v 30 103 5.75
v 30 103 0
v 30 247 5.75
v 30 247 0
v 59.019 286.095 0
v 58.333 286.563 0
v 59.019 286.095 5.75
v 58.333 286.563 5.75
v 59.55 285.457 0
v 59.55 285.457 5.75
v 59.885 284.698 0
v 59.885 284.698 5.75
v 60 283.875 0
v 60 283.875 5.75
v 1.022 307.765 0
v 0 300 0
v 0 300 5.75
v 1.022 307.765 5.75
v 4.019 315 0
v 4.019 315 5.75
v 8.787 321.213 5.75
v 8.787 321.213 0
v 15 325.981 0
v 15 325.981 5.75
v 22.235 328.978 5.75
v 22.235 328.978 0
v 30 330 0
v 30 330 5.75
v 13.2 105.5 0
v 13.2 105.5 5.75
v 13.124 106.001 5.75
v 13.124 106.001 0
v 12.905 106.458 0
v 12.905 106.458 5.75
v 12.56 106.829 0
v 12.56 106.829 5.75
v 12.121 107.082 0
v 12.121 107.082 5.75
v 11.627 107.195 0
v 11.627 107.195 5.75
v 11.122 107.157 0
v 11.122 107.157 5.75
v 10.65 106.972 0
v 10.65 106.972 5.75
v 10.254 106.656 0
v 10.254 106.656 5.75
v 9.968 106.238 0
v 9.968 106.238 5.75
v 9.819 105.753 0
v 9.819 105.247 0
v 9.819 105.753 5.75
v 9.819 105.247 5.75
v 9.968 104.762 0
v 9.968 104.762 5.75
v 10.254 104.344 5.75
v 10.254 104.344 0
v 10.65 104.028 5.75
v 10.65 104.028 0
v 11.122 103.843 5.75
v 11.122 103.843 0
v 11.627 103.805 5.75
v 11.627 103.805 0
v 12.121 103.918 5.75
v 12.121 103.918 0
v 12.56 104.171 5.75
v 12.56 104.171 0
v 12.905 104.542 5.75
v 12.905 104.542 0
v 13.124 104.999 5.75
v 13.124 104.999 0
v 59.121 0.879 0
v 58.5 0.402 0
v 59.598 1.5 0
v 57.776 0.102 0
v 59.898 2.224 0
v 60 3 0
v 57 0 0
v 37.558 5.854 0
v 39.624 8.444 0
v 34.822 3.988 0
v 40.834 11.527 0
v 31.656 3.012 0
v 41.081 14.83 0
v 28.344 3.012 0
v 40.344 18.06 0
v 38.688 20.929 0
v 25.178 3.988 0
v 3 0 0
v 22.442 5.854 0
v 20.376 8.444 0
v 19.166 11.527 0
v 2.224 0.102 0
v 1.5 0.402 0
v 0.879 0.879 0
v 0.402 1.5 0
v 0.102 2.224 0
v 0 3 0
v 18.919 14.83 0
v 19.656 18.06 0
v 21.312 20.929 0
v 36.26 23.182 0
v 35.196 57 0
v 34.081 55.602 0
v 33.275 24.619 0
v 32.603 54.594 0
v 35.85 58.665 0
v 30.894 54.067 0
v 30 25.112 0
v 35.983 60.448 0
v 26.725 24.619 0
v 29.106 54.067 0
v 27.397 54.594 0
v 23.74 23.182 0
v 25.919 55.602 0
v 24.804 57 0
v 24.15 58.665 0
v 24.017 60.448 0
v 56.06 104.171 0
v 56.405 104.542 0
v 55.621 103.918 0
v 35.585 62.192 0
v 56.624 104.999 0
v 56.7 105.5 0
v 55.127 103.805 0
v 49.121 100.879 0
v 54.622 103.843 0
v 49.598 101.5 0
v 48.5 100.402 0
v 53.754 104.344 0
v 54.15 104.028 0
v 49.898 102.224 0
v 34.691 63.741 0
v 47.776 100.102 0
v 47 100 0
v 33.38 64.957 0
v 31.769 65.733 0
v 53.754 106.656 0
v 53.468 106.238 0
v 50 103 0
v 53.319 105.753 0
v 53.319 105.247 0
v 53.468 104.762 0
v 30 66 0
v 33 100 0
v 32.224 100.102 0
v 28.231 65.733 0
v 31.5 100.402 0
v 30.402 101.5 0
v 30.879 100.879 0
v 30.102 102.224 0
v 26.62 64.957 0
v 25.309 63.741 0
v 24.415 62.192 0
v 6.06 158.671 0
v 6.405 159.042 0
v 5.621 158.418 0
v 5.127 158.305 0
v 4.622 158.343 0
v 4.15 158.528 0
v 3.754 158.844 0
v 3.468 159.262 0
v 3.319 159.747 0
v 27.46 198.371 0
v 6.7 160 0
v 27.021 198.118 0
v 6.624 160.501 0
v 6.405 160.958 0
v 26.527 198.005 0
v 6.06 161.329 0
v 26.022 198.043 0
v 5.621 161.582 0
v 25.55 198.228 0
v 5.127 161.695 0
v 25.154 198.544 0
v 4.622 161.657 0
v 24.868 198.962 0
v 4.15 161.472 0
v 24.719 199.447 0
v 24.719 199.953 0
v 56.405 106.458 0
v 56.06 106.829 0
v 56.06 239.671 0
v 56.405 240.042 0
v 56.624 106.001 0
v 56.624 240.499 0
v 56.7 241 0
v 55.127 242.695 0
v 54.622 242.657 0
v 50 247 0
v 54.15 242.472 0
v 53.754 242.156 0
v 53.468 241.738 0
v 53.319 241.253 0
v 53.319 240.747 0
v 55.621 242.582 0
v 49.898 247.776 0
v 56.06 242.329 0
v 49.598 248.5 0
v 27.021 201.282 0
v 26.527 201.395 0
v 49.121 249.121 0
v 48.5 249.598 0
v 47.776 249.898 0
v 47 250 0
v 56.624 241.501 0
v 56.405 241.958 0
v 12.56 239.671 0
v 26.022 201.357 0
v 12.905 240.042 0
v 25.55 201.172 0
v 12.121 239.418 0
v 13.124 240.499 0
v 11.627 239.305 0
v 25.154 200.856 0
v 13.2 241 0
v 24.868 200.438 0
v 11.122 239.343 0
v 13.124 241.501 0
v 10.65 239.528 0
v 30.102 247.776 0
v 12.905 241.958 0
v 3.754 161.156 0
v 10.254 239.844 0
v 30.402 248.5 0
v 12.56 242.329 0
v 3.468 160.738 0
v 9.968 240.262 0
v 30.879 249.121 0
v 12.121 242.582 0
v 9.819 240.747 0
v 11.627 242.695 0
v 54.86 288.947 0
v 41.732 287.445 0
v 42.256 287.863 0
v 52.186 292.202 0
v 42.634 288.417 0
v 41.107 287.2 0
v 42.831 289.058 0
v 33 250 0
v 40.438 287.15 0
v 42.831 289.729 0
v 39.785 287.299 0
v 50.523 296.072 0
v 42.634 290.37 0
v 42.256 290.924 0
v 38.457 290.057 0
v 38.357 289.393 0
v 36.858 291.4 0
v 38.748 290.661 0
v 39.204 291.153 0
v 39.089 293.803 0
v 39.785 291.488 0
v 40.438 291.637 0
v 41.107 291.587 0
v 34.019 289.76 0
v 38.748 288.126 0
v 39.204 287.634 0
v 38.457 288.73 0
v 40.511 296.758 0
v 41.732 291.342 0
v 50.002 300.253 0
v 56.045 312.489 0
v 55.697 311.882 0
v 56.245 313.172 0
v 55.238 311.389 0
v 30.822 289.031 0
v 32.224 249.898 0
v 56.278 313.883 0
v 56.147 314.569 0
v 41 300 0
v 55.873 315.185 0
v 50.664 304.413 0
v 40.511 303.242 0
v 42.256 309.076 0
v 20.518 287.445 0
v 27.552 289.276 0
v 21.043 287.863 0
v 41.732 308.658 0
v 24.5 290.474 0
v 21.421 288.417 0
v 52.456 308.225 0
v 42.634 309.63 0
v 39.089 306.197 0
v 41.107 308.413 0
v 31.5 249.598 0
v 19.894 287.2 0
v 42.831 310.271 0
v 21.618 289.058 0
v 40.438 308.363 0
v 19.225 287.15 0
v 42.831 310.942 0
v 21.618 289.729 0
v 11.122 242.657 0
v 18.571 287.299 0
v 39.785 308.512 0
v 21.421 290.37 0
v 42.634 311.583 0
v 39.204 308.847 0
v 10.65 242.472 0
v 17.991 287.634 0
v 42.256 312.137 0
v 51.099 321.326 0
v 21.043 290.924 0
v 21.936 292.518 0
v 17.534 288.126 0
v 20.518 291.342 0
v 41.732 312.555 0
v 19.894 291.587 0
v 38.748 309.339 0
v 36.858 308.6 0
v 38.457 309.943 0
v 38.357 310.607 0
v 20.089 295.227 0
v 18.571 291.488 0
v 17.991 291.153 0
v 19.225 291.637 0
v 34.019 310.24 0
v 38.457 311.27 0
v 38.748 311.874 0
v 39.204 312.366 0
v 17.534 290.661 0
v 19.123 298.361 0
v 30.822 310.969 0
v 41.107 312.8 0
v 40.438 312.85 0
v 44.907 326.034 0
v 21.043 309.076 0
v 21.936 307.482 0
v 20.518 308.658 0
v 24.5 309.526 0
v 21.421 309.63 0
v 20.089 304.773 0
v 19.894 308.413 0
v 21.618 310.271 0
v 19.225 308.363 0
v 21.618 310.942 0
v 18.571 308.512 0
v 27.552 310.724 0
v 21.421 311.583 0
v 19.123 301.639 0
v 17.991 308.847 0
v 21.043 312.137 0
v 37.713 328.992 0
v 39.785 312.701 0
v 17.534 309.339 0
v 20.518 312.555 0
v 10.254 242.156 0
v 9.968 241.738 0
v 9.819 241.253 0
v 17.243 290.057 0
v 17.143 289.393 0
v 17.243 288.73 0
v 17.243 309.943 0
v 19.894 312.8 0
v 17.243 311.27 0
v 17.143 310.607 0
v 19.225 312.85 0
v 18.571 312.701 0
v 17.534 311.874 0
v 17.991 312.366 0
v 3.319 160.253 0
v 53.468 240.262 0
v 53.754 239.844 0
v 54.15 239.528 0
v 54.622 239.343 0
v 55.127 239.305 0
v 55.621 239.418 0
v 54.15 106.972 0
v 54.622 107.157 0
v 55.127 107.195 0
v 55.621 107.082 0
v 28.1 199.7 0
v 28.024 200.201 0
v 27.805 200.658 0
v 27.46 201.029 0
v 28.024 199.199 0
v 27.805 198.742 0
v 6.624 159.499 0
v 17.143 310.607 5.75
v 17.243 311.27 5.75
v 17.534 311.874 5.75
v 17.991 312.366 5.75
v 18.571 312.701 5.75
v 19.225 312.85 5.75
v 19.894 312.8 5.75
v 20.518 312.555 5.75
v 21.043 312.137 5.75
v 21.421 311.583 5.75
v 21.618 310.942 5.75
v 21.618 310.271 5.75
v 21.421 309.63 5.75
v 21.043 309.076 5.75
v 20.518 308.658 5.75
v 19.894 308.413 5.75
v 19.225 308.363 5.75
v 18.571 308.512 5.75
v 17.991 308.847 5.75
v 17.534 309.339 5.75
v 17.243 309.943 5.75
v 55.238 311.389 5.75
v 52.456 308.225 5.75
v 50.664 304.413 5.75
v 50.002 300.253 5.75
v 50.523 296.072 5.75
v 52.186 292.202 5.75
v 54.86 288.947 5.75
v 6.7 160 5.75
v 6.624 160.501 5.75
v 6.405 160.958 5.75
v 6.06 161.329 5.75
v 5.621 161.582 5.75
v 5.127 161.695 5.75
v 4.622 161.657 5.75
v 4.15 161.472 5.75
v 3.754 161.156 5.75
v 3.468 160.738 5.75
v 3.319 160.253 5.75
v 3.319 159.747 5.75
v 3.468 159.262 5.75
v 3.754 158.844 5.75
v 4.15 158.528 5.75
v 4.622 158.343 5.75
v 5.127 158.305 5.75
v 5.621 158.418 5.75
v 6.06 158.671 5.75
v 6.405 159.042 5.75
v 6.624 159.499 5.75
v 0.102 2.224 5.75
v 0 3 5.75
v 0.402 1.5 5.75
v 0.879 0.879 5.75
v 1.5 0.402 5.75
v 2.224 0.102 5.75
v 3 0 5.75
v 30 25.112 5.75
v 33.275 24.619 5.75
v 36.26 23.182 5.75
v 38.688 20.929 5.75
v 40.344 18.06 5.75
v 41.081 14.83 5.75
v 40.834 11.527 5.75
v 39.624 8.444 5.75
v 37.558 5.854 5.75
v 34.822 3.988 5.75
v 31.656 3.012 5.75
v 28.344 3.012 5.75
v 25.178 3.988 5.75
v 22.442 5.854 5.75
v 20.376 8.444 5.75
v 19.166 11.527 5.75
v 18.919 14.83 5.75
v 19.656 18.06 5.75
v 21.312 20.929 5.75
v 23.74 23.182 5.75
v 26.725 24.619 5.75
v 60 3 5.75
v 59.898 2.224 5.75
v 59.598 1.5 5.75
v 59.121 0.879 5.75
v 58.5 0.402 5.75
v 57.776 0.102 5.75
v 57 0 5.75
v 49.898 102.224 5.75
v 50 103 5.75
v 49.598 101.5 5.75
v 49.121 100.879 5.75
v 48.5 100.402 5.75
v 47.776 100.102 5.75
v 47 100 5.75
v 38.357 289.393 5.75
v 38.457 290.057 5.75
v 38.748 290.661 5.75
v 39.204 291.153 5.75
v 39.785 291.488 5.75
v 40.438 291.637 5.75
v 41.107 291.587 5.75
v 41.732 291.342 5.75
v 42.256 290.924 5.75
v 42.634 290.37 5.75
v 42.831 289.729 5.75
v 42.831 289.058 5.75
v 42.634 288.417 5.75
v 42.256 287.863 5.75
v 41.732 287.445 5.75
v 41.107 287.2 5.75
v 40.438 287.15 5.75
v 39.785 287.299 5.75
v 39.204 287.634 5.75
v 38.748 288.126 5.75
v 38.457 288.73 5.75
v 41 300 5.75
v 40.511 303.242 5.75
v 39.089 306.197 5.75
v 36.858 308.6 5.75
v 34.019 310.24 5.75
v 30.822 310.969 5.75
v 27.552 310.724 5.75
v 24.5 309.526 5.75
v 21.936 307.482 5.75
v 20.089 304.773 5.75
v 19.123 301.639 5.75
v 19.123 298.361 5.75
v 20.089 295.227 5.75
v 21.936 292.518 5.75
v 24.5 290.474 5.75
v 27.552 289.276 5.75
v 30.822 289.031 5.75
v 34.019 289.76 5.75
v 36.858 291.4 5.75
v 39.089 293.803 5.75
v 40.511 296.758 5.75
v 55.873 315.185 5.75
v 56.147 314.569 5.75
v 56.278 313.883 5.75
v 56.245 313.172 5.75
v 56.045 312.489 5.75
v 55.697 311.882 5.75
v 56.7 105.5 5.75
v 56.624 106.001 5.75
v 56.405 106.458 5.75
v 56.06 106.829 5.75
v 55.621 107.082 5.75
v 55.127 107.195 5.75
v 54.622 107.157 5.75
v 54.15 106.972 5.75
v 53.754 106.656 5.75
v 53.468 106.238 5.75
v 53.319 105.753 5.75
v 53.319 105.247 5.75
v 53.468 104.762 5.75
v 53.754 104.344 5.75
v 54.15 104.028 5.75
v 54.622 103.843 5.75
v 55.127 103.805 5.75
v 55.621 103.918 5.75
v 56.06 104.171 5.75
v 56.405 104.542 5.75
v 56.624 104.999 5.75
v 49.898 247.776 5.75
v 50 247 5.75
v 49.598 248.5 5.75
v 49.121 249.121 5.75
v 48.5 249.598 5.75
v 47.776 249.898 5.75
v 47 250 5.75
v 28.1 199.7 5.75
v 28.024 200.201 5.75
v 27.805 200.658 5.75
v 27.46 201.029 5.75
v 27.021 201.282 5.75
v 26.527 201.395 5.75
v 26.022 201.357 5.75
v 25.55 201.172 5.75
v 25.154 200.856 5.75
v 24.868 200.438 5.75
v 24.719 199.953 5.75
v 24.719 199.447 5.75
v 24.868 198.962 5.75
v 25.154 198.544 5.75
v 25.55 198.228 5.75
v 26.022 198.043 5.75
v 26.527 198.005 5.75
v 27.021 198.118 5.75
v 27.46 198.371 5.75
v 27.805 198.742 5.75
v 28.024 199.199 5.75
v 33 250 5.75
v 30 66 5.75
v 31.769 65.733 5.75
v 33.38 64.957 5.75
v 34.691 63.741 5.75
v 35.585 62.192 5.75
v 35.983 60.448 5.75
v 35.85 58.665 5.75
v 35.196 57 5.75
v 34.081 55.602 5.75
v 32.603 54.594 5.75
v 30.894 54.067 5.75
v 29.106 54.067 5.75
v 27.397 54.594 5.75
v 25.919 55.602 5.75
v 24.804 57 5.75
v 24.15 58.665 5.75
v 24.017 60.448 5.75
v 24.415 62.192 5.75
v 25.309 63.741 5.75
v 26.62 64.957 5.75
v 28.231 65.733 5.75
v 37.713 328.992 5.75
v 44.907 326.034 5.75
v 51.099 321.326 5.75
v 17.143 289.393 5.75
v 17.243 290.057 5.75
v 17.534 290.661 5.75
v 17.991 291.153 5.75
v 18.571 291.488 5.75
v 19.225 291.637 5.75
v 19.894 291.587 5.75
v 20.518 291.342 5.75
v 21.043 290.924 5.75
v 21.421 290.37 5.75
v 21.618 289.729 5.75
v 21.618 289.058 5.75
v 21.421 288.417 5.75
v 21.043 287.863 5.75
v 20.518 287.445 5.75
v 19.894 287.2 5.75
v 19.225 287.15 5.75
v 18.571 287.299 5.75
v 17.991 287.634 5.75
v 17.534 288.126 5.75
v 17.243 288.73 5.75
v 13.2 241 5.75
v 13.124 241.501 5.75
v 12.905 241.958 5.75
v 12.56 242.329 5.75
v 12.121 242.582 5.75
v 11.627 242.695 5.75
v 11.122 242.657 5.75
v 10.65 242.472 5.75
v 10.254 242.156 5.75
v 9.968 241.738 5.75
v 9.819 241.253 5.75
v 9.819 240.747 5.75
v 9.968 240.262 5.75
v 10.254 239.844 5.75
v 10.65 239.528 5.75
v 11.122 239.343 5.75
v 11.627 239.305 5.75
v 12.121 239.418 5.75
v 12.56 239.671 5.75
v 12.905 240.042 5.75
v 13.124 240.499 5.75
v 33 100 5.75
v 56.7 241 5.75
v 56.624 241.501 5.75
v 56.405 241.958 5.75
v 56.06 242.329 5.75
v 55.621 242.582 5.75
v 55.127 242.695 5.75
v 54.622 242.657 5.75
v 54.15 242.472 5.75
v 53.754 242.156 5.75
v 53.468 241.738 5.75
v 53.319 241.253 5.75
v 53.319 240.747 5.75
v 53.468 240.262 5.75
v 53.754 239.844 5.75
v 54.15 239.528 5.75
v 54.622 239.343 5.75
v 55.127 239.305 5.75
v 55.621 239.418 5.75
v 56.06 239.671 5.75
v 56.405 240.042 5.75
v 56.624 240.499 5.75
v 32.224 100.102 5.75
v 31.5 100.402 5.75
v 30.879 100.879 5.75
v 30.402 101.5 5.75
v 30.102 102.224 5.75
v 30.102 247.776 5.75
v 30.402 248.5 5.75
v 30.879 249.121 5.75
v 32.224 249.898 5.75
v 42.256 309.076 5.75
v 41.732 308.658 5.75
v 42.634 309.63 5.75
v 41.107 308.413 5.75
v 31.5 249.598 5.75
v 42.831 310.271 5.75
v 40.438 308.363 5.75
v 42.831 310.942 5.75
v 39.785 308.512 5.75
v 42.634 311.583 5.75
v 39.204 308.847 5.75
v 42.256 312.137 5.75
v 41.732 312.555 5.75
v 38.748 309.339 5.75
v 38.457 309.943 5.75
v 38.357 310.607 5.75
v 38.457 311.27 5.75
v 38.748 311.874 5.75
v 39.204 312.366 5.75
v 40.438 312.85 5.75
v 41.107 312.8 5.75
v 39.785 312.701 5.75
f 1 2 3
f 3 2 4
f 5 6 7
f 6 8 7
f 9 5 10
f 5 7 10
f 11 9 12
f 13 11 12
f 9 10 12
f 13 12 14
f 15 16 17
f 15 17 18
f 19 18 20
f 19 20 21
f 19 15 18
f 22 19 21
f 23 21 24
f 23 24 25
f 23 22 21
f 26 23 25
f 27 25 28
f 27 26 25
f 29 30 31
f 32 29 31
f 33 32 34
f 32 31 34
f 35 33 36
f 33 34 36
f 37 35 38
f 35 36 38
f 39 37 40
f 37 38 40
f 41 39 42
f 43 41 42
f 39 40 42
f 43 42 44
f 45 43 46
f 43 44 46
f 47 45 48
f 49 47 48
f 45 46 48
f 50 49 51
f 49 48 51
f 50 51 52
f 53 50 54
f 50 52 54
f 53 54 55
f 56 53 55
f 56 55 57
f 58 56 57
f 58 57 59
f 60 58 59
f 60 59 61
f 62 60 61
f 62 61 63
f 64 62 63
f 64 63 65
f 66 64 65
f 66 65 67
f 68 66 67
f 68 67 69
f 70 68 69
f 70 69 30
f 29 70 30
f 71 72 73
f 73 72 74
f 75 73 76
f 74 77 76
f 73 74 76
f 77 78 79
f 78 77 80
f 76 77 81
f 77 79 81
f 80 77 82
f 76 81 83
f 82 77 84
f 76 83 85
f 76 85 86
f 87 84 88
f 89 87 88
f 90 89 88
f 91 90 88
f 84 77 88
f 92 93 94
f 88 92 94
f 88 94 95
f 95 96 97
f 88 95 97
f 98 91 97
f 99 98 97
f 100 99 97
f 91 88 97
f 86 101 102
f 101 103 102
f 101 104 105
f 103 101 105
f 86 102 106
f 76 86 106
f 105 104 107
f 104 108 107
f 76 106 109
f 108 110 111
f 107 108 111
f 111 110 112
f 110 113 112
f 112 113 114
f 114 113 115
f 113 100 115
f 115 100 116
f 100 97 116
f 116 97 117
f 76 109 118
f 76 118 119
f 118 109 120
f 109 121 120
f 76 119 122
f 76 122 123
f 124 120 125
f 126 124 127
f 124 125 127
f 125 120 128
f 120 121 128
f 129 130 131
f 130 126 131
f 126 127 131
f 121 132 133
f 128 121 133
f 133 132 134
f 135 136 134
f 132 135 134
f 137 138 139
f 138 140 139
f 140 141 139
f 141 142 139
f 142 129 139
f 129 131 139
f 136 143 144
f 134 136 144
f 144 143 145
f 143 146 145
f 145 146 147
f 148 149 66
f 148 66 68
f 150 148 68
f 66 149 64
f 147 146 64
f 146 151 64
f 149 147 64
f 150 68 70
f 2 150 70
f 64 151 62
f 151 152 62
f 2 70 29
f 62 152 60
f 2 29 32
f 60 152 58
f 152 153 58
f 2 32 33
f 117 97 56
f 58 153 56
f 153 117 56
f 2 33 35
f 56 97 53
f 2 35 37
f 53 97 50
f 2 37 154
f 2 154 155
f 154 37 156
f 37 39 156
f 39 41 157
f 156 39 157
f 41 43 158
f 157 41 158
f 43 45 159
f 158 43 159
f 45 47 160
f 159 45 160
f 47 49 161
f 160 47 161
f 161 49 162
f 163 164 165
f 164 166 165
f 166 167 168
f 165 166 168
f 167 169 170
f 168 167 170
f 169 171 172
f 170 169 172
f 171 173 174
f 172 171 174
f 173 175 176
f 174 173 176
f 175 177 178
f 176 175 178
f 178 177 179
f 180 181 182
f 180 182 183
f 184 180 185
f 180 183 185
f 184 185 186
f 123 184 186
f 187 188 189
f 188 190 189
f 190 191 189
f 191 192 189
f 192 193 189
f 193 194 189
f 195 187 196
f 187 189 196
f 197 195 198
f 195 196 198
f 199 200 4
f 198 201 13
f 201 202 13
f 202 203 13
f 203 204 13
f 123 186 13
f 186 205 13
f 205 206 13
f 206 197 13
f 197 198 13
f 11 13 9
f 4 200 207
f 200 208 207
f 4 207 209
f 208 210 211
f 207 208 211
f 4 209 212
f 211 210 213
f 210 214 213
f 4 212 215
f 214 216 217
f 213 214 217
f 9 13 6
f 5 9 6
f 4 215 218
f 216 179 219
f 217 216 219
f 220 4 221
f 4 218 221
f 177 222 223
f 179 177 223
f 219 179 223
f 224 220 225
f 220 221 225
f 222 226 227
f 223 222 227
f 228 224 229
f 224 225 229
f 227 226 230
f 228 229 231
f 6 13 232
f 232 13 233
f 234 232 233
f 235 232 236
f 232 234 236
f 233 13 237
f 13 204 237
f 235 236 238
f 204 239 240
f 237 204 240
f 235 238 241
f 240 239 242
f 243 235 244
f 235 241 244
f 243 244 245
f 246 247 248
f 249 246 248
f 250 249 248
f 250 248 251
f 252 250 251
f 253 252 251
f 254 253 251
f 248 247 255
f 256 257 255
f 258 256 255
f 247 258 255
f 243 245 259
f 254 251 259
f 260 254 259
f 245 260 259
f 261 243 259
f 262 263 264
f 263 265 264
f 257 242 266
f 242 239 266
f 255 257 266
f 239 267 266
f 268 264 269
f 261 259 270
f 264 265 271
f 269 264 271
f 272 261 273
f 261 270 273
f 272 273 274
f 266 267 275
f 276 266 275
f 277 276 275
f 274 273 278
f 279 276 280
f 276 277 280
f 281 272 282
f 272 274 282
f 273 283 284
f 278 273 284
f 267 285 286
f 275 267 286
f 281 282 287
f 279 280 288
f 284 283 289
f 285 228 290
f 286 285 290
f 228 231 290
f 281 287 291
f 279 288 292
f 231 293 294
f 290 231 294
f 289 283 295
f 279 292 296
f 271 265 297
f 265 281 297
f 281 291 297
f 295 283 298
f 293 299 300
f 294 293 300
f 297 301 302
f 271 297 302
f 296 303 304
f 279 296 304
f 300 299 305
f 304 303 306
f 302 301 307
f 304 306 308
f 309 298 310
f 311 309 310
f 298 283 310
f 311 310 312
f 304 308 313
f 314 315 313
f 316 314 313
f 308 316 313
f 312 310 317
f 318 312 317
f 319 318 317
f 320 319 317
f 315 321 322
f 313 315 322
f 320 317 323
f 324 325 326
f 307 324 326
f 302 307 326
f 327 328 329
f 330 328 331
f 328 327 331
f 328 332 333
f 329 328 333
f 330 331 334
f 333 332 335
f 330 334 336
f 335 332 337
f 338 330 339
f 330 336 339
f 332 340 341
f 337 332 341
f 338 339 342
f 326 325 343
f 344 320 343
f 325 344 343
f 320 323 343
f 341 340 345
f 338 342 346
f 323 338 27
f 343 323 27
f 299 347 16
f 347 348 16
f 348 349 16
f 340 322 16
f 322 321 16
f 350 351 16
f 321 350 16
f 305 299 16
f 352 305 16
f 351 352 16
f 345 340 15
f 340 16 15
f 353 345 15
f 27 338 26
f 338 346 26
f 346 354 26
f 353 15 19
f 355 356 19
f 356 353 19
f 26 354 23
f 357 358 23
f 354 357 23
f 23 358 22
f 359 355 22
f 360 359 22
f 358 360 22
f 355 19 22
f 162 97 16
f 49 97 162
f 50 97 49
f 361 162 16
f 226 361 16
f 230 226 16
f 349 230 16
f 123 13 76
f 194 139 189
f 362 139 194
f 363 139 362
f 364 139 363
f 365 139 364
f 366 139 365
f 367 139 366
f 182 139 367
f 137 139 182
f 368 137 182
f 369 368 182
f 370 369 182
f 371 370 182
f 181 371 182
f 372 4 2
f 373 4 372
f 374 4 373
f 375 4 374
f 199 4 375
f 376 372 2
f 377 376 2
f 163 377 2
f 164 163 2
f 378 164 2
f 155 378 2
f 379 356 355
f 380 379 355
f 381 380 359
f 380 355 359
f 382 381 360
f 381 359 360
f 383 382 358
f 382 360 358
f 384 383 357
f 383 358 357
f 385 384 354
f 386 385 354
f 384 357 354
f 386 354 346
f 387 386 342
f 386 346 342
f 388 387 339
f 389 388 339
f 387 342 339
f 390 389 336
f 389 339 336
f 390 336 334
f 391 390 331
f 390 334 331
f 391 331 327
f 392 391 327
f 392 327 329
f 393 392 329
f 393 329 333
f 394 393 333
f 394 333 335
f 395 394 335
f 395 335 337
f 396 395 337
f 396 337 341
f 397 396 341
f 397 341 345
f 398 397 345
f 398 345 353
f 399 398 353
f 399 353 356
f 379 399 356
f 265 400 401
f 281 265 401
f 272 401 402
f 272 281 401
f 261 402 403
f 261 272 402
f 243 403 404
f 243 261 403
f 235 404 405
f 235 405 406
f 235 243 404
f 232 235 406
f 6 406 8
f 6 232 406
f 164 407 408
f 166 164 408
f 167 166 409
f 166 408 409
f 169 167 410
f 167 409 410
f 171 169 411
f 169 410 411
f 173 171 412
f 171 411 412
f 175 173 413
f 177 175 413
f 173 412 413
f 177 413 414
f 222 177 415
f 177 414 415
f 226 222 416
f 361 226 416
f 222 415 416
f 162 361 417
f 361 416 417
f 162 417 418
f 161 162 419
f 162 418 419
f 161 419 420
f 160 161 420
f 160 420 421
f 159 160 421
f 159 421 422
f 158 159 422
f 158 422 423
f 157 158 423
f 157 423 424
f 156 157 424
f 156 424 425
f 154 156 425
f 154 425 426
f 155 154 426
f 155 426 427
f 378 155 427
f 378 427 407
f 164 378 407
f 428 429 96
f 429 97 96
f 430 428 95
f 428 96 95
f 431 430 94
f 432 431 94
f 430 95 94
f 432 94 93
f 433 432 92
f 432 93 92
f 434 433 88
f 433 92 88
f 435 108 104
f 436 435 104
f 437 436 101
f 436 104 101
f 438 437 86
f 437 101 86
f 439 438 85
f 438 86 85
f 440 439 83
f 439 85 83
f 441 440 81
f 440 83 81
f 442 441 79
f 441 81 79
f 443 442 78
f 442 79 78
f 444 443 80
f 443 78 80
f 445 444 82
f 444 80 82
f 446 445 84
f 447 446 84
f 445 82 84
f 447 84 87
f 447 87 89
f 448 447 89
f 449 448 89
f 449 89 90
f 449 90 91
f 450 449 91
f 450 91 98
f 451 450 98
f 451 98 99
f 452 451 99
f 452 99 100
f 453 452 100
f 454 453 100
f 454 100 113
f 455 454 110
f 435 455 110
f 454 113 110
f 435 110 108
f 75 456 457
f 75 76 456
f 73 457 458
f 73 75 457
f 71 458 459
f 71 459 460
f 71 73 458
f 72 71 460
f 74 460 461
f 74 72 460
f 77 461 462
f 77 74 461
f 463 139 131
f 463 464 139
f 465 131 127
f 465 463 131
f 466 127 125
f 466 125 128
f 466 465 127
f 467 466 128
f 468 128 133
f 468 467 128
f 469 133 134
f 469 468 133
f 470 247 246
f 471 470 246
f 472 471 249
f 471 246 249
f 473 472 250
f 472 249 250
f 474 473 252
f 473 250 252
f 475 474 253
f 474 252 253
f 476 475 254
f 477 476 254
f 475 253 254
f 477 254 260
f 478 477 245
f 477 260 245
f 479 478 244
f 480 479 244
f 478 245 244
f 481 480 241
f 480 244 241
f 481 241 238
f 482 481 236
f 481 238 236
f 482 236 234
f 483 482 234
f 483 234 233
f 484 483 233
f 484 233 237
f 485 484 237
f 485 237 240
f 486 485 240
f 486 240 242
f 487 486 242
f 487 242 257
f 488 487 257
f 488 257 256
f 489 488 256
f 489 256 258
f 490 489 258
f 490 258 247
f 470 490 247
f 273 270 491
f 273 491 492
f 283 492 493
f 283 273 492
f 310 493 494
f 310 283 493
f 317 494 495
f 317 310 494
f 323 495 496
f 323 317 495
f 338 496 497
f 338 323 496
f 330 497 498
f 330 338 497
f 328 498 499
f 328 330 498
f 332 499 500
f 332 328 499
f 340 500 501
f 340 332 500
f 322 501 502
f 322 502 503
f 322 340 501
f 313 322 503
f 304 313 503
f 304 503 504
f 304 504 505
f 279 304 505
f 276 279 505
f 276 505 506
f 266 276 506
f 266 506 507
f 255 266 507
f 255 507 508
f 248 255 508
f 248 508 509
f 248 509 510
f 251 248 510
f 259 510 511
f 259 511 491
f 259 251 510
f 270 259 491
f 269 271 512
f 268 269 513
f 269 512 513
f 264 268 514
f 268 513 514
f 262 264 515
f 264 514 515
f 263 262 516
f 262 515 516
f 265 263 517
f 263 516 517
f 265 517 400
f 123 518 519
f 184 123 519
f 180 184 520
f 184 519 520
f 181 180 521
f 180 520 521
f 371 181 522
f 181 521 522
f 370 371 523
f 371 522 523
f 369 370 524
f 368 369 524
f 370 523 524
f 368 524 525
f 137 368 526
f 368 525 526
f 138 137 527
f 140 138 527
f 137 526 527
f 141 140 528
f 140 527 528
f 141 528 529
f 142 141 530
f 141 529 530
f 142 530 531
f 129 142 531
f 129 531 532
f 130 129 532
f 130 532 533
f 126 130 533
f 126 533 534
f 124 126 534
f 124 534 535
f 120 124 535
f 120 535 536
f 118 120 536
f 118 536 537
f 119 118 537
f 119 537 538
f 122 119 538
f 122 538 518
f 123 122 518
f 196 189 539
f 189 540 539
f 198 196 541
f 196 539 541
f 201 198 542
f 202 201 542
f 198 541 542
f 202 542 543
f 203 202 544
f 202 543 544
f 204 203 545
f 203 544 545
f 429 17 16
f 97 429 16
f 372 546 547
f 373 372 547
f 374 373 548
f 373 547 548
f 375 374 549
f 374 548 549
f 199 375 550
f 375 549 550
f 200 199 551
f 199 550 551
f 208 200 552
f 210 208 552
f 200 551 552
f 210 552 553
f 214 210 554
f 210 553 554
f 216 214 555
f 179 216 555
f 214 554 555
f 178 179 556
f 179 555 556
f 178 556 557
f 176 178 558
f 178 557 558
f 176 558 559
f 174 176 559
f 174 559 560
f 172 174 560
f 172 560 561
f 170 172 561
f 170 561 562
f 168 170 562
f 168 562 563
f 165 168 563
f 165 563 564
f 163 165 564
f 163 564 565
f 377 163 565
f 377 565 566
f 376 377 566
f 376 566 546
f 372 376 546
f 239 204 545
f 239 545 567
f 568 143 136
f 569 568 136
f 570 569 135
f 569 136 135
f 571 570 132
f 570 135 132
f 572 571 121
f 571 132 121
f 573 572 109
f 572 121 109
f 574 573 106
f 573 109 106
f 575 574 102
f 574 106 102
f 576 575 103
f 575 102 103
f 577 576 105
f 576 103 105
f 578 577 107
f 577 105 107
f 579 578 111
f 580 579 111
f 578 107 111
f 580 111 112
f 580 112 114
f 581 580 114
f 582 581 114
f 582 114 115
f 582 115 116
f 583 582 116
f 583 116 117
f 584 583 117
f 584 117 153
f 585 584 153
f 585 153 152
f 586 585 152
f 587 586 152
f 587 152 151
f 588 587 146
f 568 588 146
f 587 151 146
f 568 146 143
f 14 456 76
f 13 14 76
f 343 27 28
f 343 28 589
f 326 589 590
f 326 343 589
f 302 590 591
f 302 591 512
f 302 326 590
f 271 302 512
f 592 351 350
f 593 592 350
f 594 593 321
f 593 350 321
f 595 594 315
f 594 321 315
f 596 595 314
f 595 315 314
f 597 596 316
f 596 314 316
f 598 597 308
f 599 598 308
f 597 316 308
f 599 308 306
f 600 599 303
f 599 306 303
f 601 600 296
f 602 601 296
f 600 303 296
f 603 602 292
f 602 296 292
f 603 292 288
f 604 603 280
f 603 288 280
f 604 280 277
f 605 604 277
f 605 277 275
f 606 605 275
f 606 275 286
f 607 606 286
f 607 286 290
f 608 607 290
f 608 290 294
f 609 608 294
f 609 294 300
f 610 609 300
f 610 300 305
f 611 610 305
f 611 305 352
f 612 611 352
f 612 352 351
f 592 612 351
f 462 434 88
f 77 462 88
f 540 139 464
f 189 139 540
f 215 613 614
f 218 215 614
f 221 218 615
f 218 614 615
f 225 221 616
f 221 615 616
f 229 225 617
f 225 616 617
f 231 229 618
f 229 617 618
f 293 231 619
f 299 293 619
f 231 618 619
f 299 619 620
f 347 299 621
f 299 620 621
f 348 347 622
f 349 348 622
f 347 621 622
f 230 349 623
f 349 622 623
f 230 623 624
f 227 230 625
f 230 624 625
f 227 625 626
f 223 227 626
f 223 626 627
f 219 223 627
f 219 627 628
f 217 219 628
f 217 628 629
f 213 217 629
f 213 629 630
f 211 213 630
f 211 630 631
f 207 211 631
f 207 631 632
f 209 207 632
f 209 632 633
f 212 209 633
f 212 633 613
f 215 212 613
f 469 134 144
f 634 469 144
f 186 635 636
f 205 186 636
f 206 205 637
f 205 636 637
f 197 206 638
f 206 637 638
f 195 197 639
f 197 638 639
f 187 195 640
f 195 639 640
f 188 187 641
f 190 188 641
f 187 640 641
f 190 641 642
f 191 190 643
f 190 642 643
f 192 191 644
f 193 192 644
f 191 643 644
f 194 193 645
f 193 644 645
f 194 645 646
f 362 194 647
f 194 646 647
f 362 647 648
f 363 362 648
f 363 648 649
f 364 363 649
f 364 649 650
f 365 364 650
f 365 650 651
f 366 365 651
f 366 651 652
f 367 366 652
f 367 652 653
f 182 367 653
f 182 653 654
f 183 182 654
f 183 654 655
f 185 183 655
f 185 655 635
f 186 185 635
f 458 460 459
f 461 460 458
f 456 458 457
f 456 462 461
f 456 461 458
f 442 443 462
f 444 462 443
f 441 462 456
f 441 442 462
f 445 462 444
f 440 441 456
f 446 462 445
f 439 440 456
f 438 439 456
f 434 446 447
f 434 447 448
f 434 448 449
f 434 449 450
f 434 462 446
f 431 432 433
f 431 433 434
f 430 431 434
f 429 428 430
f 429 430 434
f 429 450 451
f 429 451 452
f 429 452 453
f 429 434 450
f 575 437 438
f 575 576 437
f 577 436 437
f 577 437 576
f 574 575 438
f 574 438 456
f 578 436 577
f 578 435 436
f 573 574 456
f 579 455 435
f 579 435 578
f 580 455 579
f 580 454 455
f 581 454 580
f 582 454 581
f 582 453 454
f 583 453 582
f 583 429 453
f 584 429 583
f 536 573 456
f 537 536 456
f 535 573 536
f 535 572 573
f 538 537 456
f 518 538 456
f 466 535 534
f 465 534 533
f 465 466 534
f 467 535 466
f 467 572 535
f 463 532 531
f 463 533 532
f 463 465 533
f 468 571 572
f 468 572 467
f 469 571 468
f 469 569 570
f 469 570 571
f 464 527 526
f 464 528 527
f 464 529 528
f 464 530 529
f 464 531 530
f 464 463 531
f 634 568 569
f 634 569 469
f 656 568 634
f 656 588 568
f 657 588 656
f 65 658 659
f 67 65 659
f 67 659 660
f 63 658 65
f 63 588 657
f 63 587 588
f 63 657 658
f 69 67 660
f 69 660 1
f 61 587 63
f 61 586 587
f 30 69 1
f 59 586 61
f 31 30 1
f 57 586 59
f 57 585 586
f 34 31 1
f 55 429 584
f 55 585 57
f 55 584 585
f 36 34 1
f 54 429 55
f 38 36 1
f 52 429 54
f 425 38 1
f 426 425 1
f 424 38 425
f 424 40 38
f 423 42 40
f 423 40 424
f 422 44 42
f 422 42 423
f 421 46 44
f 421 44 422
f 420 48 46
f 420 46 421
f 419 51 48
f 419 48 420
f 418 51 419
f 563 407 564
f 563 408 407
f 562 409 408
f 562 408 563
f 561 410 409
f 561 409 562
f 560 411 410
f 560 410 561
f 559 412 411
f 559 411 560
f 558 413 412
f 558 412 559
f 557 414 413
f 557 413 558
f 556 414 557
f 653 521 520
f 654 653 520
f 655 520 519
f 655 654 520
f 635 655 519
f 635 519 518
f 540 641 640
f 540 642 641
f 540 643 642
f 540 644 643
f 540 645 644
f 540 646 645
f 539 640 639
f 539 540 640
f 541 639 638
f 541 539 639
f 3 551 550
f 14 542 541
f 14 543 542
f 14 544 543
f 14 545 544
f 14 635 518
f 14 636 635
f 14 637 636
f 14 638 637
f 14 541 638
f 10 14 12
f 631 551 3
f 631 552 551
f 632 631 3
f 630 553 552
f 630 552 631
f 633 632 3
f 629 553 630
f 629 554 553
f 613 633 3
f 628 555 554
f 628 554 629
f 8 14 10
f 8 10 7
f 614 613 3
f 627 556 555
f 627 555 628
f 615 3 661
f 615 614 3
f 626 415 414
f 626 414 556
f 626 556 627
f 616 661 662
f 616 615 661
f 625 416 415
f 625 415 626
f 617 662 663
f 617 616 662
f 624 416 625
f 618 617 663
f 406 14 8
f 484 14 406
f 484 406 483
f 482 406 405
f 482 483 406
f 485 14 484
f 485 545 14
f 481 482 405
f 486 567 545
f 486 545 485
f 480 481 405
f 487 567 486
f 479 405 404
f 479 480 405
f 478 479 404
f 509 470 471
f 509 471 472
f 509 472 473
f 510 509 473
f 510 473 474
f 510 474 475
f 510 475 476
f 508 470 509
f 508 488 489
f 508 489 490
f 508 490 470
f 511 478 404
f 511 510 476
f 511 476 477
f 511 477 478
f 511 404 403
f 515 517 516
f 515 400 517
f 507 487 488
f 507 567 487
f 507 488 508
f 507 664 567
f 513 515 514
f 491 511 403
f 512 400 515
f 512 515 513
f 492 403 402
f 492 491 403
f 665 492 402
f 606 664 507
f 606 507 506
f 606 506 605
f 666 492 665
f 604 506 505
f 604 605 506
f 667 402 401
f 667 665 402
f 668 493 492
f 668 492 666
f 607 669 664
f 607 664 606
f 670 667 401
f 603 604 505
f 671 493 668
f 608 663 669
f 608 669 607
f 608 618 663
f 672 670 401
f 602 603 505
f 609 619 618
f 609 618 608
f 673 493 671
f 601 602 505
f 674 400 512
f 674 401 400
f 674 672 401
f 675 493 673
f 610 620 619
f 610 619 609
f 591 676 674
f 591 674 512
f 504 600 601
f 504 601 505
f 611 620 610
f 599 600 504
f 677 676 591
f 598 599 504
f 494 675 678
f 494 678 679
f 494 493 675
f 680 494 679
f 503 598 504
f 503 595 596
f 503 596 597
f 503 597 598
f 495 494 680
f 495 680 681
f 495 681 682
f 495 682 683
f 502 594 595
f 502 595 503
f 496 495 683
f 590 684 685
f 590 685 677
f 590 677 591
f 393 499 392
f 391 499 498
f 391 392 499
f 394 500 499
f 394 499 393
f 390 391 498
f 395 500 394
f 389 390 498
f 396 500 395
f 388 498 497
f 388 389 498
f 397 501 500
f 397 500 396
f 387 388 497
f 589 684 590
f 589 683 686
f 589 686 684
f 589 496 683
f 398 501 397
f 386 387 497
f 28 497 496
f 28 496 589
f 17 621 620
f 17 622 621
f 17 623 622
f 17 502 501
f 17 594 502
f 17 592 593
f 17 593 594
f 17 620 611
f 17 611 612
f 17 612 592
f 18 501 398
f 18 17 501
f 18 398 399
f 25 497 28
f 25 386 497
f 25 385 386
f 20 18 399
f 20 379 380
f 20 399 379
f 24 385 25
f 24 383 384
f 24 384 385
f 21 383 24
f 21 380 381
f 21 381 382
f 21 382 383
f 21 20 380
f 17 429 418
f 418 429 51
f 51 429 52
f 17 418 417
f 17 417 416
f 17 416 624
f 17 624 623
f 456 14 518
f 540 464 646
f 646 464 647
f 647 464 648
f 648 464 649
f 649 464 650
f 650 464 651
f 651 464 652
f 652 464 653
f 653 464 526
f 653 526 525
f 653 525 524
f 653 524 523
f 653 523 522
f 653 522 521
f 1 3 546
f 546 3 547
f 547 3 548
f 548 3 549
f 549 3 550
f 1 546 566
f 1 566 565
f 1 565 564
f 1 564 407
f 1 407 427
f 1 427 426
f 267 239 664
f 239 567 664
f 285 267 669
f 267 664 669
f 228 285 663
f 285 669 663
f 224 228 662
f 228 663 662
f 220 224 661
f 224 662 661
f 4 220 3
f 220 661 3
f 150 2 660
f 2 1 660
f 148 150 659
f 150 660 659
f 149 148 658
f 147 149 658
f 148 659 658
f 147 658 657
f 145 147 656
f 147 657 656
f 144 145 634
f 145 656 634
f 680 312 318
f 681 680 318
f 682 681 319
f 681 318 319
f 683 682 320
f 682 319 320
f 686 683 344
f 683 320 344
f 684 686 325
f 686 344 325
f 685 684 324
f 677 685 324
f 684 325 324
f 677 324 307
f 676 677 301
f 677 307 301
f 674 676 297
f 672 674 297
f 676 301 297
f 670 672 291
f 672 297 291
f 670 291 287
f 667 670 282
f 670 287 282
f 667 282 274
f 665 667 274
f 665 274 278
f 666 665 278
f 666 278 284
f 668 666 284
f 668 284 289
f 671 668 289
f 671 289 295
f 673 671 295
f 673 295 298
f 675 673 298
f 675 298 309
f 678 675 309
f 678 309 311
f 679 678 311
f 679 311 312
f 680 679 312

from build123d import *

# Parameters (mm, degrees)
SKETCH1_W              = 5.75
SKETCH1_H              = 330
BOSS_EXTRUDE1_DEPTH    = 60
CUT_EXTRUDE1_START     = -5.75
CUT_EXTRUDE1_OUTLINE_R = 11
CUT_EXTRUDE1_DEPTH     = 5.75
M4_CLEARANCE_HOLE1_D   = 4.5
SKETCH10_R             = 11.1125
CUT_EXTRUDE4_DEPTH     = 5.75
SKETCH13_R             = 6
SKETCH13_W             = 20
SKETCH13_H             = 150
CUT_EXTRUDE5_DEPTH     = 5.75
FILLET2_R              = 3
M3_CLEARANCE_HOLE1_D   = 3.4


# Read off the part's stored shape, not the designer's step: Cut-Extrude1
with BuildPart() as part:
    # Sketch1 → Boss-Extrude1 (new body)
    with BuildSketch(Plane(origin=(0, 0, 0), x_dir=(0, 0, -1), z_dir=(1, 0, 0))):
        with Locations((-2.875, 165)):
            Rectangle(SKETCH1_W, SKETCH1_H)
    extrude(amount=BOSS_EXTRUDE1_DEPTH)

    # Cut-Extrude1 outline → Cut-Extrude1 (cut)
    with BuildSketch(Plane.XY.offset(5.75).offset(CUT_EXTRUDE1_START)):
        with BuildLine():
            ThreePointArc((0, 300), (8.786796564, 321.213203436), (30, 330))
            Line((30, 330), (0, 330))
            Line((0, 330), (0, 300))
        make_face()
        with BuildLine():
            ThreePointArc((30, 330), (51.213203436, 321.213203436), (60, 300))
            Line((60, 300), (60, 330))
            Line((60, 330), (30, 330))
        make_face()
        with Locations((30, 300)):
            Circle(CUT_EXTRUDE1_OUTLINE_R)
    extrude(amount=CUT_EXTRUDE1_DEPTH, mode=Mode.SUBTRACT)

    # M4 Clearance Hole1 (through all)
    with Locations(Plane.XY.offset(5.75)):
        with Locations((19.393398282, 310.606601718), (40.606601718, 310.606601718), (40.606601718, 289.393398282), (19.393398282, 289.393398282)):
            Hole(M4_CLEARANCE_HOLE1_D / 2)

    # Sketch10 → Cut-Extrude4 (cut)
    with BuildSketch(Plane(origin=(0, 0, 0), x_dir=(-1, 0, 0), z_dir=(0, 0, -1))):
        with Locations(Location((-30, 14, 0), (0, 0, 90))):
            Circle(SKETCH10_R)
    extrude(amount=-CUT_EXTRUDE4_DEPTH, mode=Mode.SUBTRACT)

    # Sketch13 → Cut-Extrude5 (cut)
    with BuildSketch(Plane(origin=(0, 0, 0), x_dir=(-1, 0, 0), z_dir=(0, 0, -1))):
        with Locations(Location((-30, 60, 0), (0, 0, 90))):
            Circle(SKETCH13_R)
        with Locations((-40, 175)):
            Rectangle(SKETCH13_W, SKETCH13_H)
        with BuildLine():
            Line((-60, 285.857864376), (-60, 300))
            ThreePointArc((-60, 300), (-59.277002188, 306.546536707), (-57.142857143, 312.7775313))
            ThreePointArc((-57.142857143, 312.7775313), (-50.08377905, 298.416853586), (-60, 285.857864376))
        make_face()
    extrude(amount=-CUT_EXTRUDE5_DEPTH, mode=Mode.SUBTRACT)

    # Fillet2
    fillet2_edges = [part.edges().sort_by_distance(p)[0] for p in [
        (60, 0, 2.875),
        (0, 0, 2.875),
        (57.142857143, 312.7775313, 2.875),
        (60, 285.857864376, 2.875),
        (50, 100, 2.875),
        (50, 250, 2.875),
        (30, 250, 2.875),
        (30, 100, 2.875),
    ]]
    fillet(fillet2_edges, radius=FILLET2_R)

    # M3 Clearance Hole1 (through all)
    with Locations(Plane(origin=(0, 0, 0), x_dir=(-1, 0, 0), z_dir=(0, 0, -1))):
        with Locations((-11.50000102, 240.99999992), (-55.00000038, 240.99999992), (-11.50000102, 105.49999914), (-55.00000038, 105.49999914), (-5, 160), (-26.4, 199.7)):
            Hole(M3_CLEARANCE_HOLE1_D / 2)


solid = part.part
